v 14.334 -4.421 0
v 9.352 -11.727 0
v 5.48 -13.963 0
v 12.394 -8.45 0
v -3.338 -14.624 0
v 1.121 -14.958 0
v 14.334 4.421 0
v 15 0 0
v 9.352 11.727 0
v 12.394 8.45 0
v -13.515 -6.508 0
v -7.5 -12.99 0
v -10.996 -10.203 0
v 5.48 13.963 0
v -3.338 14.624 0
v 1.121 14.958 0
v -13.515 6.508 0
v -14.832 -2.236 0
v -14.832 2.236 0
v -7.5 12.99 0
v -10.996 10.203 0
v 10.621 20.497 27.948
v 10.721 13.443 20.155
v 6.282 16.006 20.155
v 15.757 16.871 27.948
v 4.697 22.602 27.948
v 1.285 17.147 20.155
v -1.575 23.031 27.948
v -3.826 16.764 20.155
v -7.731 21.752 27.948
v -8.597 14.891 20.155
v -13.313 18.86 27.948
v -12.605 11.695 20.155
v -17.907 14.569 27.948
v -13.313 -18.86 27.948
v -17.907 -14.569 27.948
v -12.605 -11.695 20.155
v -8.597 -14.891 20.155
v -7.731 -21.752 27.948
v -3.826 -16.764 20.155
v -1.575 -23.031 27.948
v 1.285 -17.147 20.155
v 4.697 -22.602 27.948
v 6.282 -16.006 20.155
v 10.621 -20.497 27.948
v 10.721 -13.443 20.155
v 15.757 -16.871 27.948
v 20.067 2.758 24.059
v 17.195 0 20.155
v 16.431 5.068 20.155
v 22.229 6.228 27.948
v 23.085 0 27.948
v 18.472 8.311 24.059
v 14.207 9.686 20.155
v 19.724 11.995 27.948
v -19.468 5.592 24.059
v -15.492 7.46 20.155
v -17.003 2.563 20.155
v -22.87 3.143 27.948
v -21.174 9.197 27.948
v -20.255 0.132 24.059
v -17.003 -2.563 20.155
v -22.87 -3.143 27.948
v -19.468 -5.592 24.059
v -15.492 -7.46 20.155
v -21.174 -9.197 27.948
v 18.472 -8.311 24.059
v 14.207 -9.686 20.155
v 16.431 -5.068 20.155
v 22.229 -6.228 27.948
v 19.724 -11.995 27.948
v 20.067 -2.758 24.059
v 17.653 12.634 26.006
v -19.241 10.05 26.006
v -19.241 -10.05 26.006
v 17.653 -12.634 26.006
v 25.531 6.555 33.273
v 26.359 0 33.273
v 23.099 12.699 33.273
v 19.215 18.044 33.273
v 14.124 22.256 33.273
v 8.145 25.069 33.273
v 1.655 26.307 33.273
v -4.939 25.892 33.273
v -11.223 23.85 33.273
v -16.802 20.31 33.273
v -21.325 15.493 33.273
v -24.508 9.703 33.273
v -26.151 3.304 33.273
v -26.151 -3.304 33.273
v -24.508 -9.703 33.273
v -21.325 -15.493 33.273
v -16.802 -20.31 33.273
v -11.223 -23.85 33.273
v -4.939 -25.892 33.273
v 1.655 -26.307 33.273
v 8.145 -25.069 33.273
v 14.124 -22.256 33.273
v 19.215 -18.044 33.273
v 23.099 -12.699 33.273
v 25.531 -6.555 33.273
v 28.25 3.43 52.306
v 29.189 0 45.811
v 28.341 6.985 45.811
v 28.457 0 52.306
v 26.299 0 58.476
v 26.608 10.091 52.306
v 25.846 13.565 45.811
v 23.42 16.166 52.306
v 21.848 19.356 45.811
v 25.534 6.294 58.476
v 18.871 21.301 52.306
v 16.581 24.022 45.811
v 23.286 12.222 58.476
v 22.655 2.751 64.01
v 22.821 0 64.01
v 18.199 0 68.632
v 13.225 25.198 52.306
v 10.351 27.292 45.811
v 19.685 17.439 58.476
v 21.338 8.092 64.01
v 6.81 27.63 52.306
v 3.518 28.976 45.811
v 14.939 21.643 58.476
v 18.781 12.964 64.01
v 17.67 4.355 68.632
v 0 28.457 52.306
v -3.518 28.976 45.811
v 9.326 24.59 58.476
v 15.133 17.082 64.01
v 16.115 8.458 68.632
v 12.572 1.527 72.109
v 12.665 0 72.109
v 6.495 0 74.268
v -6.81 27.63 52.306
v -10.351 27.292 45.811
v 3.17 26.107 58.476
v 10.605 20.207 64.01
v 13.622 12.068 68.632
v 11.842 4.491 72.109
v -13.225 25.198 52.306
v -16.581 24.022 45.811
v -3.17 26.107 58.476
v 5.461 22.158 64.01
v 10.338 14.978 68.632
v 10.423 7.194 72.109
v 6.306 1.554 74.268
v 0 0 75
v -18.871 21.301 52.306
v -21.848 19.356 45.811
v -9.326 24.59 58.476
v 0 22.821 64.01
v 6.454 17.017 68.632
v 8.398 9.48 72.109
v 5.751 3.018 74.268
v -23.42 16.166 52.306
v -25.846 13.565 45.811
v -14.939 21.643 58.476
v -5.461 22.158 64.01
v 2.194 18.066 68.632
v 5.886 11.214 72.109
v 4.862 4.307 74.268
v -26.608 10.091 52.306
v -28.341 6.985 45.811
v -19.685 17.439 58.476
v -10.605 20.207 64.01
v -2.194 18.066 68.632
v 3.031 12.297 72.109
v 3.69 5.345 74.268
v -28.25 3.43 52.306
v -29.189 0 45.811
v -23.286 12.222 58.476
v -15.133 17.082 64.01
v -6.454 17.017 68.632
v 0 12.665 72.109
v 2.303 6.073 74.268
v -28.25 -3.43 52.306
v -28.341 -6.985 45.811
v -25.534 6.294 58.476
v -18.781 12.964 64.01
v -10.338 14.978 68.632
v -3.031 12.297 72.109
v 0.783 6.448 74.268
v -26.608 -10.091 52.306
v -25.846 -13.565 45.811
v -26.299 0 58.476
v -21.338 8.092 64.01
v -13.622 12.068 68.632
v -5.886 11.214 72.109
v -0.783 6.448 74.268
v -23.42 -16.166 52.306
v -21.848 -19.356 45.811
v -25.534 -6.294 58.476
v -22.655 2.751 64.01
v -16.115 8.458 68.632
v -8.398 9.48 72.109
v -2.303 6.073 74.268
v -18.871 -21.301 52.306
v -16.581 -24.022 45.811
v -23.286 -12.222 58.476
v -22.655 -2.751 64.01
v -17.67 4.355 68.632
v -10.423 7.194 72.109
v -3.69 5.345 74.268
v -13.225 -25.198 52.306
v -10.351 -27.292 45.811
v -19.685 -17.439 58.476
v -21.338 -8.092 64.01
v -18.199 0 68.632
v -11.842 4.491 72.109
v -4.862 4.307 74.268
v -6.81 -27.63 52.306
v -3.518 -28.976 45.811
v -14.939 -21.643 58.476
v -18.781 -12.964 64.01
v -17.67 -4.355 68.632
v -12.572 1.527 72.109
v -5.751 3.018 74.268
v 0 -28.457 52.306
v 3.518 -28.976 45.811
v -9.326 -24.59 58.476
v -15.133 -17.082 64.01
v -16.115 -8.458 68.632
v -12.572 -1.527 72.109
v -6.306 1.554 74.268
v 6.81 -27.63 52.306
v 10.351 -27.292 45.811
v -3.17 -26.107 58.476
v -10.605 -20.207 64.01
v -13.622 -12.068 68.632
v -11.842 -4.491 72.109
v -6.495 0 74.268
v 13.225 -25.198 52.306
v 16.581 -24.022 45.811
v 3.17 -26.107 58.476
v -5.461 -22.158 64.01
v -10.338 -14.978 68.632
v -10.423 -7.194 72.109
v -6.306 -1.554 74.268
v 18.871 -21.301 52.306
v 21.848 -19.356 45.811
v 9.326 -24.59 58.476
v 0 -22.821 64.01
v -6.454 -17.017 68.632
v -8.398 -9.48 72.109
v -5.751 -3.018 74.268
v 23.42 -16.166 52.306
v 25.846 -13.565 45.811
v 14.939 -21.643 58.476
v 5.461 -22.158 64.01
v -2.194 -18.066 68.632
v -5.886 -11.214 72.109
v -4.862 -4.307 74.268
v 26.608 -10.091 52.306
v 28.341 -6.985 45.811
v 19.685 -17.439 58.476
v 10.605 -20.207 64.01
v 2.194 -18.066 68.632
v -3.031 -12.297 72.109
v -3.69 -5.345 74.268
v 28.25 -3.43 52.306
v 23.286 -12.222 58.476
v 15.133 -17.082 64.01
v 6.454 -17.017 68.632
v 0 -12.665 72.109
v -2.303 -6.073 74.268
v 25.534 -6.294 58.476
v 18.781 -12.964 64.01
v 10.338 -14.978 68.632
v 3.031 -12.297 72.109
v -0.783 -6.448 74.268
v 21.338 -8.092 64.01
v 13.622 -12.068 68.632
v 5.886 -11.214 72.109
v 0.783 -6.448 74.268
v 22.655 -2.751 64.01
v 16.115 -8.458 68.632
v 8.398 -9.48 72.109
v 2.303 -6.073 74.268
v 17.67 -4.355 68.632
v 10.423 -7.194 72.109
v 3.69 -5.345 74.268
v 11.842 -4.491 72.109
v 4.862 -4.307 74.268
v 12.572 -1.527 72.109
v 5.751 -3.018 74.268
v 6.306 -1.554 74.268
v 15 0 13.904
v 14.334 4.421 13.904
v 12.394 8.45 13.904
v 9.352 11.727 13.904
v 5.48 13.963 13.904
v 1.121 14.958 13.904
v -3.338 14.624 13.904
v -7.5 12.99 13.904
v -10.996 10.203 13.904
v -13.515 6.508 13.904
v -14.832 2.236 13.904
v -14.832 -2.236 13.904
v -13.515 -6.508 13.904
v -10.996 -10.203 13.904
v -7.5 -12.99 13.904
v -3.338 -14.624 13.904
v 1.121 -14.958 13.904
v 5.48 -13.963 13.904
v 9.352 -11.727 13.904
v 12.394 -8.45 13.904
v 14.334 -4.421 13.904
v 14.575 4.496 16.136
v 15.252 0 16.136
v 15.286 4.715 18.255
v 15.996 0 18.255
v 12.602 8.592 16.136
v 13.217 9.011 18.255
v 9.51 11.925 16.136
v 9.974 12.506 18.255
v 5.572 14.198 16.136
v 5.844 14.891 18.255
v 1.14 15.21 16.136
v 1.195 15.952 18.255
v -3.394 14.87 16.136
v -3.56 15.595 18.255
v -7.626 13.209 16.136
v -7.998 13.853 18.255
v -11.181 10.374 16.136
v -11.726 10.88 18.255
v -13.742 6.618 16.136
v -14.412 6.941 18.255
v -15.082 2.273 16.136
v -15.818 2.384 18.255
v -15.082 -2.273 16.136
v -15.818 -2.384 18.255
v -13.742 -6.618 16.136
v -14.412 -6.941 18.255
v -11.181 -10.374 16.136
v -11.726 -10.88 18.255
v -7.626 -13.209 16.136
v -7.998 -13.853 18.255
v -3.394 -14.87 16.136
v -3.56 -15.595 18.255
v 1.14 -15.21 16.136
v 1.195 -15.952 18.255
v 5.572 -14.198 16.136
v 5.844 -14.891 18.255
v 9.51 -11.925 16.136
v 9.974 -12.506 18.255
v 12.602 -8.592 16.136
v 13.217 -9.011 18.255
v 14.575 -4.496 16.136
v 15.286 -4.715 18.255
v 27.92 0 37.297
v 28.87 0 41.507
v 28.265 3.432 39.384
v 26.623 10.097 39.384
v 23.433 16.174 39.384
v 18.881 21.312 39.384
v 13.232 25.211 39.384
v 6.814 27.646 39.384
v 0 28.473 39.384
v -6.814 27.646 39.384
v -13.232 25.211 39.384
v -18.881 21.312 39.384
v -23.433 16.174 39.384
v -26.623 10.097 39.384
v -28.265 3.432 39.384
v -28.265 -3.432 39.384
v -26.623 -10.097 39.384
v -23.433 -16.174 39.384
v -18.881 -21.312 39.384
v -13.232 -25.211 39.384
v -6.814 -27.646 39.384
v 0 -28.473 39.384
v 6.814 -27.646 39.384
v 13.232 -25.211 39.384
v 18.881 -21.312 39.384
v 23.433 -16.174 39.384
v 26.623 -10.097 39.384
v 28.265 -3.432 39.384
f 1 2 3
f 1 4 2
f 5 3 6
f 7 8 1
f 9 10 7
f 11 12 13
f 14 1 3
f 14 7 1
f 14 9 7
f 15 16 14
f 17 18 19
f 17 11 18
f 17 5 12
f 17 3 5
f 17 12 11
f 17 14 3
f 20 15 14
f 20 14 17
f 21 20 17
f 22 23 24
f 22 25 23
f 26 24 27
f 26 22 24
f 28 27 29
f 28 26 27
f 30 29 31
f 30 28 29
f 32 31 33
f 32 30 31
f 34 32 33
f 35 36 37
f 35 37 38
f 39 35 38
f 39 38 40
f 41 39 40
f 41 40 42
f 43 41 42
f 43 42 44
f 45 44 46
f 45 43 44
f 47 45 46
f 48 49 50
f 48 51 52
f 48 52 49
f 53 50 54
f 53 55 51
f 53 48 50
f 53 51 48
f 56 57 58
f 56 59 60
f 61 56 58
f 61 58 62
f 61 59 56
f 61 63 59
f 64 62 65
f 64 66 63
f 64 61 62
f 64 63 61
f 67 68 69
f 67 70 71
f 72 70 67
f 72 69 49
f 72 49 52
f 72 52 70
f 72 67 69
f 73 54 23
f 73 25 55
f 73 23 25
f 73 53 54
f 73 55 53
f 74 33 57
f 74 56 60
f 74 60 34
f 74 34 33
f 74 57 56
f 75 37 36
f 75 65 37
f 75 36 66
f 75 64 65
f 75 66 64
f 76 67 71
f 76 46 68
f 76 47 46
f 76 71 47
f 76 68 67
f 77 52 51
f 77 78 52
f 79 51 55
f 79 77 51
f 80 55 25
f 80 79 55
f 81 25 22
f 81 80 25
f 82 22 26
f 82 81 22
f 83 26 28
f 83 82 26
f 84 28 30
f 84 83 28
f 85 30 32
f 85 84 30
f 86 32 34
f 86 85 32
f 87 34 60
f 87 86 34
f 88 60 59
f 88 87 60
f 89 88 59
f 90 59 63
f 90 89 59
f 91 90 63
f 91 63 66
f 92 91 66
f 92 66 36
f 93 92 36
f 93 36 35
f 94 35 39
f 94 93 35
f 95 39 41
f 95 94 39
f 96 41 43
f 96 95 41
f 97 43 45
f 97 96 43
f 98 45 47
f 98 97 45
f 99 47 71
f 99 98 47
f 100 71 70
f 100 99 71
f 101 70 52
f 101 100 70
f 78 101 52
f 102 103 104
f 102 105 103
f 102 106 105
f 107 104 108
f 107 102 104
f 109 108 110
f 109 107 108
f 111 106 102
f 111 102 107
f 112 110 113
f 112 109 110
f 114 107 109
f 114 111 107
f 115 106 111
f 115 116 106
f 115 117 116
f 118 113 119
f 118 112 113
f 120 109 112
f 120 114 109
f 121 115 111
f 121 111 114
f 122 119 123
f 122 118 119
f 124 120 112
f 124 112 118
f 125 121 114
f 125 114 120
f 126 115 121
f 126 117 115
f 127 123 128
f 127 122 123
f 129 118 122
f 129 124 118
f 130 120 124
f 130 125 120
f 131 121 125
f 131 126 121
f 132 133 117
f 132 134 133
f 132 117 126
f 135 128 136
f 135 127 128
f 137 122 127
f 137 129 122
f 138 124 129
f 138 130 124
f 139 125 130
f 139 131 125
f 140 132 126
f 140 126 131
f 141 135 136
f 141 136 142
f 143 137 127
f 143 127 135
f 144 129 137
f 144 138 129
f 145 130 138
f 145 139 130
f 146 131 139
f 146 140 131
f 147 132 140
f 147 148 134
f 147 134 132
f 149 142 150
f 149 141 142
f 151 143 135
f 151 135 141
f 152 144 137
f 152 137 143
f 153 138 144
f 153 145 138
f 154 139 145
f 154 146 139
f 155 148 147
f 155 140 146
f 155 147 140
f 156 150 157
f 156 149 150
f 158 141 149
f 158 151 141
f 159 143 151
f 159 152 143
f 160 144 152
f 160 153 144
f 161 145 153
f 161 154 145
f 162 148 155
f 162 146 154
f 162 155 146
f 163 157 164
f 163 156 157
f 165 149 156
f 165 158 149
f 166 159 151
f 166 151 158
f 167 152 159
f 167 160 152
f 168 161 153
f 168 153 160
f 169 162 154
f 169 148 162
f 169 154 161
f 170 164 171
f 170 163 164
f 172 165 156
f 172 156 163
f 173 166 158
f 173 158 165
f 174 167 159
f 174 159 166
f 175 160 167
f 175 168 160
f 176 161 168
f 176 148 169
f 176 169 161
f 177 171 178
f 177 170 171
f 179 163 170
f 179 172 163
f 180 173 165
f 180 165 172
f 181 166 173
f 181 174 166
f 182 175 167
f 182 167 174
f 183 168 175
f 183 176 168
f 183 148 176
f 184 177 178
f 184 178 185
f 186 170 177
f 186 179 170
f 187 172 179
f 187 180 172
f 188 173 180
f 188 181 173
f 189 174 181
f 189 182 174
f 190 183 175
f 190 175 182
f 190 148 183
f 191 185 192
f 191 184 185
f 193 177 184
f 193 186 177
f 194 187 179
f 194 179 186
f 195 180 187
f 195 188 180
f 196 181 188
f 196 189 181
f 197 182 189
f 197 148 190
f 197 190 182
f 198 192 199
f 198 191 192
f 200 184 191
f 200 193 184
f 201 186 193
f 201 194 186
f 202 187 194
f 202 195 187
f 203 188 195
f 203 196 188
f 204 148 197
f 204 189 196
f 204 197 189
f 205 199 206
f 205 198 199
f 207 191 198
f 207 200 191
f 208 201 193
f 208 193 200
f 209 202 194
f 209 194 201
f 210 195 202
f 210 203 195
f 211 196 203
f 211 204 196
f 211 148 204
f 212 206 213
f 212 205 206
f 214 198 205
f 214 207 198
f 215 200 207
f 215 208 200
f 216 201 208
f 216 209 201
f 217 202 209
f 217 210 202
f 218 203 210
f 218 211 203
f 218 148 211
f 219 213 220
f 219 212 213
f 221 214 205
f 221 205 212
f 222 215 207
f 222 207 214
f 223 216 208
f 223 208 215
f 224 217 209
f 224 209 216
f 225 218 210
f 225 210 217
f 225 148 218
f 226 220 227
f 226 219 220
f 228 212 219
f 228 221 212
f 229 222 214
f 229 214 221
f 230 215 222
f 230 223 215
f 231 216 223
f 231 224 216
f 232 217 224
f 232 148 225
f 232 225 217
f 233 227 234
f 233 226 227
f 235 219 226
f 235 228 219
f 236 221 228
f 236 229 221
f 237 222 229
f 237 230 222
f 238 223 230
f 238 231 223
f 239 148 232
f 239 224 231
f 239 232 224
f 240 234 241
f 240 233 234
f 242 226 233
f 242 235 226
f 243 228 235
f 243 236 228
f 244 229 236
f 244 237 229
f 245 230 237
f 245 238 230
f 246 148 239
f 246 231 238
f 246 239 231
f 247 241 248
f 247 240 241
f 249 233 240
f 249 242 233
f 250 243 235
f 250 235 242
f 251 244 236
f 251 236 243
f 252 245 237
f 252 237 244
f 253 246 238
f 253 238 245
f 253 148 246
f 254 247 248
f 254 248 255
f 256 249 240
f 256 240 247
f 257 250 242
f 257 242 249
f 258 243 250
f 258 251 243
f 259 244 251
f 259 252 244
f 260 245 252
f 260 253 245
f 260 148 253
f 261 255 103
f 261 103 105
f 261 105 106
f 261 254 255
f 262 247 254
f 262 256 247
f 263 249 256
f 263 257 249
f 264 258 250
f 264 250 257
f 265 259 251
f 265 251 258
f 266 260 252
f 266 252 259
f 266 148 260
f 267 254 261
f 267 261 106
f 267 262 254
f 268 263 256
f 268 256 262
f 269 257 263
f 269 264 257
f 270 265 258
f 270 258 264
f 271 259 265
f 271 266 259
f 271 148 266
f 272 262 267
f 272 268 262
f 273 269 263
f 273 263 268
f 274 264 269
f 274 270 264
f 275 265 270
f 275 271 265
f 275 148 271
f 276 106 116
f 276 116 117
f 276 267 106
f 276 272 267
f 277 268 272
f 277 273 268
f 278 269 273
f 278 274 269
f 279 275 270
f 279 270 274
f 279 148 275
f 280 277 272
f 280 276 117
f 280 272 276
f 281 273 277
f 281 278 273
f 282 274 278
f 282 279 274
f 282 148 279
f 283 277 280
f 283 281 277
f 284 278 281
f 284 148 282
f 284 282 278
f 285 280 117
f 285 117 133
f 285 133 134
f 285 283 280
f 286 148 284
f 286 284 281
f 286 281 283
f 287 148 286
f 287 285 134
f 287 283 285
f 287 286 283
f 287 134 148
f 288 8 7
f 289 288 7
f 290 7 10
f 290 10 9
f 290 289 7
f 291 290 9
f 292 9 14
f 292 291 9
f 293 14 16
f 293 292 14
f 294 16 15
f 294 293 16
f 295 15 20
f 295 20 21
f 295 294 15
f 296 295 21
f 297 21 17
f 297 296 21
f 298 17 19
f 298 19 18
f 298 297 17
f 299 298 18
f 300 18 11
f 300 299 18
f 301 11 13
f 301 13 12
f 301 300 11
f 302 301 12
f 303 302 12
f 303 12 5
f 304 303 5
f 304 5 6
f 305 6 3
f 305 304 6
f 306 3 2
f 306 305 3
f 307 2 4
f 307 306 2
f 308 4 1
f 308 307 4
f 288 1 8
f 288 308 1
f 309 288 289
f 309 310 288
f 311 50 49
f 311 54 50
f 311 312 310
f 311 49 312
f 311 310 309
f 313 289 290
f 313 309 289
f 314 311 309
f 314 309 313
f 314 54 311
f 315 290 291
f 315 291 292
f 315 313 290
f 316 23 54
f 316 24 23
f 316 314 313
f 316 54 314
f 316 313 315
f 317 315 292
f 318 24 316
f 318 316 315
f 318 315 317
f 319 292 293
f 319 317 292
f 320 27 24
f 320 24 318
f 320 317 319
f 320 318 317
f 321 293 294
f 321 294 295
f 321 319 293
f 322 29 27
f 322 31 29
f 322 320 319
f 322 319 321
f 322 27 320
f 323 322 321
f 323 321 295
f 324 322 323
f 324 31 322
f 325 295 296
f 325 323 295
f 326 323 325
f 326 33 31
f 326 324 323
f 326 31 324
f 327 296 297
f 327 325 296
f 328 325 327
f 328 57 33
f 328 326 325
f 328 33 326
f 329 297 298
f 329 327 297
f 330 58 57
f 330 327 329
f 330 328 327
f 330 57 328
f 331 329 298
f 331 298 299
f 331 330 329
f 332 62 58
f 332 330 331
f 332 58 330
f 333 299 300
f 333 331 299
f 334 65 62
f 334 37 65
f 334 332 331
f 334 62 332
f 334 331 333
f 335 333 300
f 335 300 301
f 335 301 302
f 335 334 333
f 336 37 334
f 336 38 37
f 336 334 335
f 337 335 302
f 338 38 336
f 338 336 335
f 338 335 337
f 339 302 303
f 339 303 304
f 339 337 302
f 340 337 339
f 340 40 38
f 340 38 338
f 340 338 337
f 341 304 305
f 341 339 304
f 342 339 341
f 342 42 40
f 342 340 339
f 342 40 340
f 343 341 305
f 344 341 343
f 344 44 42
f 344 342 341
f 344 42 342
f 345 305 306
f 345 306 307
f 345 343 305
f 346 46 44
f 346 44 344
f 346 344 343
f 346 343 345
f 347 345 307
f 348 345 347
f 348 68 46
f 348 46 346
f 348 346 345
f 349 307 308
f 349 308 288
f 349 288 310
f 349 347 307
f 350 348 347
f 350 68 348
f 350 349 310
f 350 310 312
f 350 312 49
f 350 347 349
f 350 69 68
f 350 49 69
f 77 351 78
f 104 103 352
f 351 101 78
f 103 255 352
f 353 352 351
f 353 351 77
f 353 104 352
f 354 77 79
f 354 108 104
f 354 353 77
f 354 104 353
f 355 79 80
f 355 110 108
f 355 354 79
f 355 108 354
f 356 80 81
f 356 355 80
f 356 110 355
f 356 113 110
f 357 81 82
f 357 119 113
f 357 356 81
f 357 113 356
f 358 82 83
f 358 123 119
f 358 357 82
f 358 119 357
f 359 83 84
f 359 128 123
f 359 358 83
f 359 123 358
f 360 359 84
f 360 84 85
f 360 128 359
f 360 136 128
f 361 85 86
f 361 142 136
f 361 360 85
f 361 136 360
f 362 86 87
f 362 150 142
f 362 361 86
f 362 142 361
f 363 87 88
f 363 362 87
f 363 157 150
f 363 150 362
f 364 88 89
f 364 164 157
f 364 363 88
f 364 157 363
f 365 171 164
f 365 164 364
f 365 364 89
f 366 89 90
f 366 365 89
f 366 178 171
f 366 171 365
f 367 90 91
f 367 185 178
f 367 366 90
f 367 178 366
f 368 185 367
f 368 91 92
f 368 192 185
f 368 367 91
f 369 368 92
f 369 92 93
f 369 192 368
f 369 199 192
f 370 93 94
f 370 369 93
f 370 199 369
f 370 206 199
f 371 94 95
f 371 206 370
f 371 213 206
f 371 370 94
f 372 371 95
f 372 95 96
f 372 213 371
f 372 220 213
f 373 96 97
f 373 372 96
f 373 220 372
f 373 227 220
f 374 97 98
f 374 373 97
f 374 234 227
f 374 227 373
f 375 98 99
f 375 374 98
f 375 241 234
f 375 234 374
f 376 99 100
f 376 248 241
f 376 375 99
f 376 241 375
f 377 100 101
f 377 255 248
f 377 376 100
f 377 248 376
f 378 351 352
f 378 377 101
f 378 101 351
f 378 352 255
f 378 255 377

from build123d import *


with BuildPart() as f1:
    # F0 (on Front) → F1 (revolve)
    with BuildSketch(Plane.XZ):
        with BuildLine():
            Line((0, 17.4324345394), (0, 0))
            Line((0, 0), (15, 0))
            Line((15, 0), (15, 13.903540875))
            ThreePointArc((15, 13.903540875), (15.5646049408, 17.2161410738), (17.1946640153, 20.1546791847))
            add(Edge.make_bspline(
                [(17.1946640153, 20.1546791847), (19.2820687523, 22.7610677336), (21.3061725207, 25.3630195661), (23.0850826912, 27.947785967)],
                knots=[0.0438155979, 0.0438155979, 0.0438155979, 0.0438155979, 0.1697178469, 0.1697178469, 0.1697178469, 0.1697178469], degree=3))
            add(Edge.make_bspline(
                [(23.0850826912, 27.947785967), (24.3132478505, 29.7323167944), (25.4245398901, 31.5086560743), (26.3591006498, 33.272608394)],
                knots=[0.1697178469, 0.1697178469, 0.1697178469, 0.1697178469, 0.2566411543, 0.2566411543, 0.2566411543, 0.2566411543], degree=3))
            ThreePointArc((26.3591006498, 33.272608394), (28.4728772846, 39.383993976), (29.1891884869, 45.8108115131))
            add(Edge.make_bspline(
                [(29.1891884869, 45.8108115131), (27.5186066734, 56.1054005015), (13.7593033367, 65.5527002508), (0, 75)],
                knots=[0.4671507953, 0.4671507953, 0.4671507953, 0.4671507953, 1, 1, 1, 1], degree=3))
            Line((0, 75), (0, 17.4324345394))
        make_face()
        with BuildLine():
            ThreePointArc((29.1891884869, 45.8108115131), (20.6398731164, 66.4506846295), (0, 75))
            add(Edge.make_bspline(
                [(29.1891884869, 45.8108115131), (27.5186066734, 56.1054005015), (13.7593033367, 65.5527002508), (0, 75)],
                knots=[0.4671507953, 0.4671507953, 0.4671507953, 0.4671507953, 1, 1, 1, 1], degree=3))
        make_face()
    revolve(axis=Axis((0, 0, 37.5), (0, 0, 1)))


solid = f1.part
